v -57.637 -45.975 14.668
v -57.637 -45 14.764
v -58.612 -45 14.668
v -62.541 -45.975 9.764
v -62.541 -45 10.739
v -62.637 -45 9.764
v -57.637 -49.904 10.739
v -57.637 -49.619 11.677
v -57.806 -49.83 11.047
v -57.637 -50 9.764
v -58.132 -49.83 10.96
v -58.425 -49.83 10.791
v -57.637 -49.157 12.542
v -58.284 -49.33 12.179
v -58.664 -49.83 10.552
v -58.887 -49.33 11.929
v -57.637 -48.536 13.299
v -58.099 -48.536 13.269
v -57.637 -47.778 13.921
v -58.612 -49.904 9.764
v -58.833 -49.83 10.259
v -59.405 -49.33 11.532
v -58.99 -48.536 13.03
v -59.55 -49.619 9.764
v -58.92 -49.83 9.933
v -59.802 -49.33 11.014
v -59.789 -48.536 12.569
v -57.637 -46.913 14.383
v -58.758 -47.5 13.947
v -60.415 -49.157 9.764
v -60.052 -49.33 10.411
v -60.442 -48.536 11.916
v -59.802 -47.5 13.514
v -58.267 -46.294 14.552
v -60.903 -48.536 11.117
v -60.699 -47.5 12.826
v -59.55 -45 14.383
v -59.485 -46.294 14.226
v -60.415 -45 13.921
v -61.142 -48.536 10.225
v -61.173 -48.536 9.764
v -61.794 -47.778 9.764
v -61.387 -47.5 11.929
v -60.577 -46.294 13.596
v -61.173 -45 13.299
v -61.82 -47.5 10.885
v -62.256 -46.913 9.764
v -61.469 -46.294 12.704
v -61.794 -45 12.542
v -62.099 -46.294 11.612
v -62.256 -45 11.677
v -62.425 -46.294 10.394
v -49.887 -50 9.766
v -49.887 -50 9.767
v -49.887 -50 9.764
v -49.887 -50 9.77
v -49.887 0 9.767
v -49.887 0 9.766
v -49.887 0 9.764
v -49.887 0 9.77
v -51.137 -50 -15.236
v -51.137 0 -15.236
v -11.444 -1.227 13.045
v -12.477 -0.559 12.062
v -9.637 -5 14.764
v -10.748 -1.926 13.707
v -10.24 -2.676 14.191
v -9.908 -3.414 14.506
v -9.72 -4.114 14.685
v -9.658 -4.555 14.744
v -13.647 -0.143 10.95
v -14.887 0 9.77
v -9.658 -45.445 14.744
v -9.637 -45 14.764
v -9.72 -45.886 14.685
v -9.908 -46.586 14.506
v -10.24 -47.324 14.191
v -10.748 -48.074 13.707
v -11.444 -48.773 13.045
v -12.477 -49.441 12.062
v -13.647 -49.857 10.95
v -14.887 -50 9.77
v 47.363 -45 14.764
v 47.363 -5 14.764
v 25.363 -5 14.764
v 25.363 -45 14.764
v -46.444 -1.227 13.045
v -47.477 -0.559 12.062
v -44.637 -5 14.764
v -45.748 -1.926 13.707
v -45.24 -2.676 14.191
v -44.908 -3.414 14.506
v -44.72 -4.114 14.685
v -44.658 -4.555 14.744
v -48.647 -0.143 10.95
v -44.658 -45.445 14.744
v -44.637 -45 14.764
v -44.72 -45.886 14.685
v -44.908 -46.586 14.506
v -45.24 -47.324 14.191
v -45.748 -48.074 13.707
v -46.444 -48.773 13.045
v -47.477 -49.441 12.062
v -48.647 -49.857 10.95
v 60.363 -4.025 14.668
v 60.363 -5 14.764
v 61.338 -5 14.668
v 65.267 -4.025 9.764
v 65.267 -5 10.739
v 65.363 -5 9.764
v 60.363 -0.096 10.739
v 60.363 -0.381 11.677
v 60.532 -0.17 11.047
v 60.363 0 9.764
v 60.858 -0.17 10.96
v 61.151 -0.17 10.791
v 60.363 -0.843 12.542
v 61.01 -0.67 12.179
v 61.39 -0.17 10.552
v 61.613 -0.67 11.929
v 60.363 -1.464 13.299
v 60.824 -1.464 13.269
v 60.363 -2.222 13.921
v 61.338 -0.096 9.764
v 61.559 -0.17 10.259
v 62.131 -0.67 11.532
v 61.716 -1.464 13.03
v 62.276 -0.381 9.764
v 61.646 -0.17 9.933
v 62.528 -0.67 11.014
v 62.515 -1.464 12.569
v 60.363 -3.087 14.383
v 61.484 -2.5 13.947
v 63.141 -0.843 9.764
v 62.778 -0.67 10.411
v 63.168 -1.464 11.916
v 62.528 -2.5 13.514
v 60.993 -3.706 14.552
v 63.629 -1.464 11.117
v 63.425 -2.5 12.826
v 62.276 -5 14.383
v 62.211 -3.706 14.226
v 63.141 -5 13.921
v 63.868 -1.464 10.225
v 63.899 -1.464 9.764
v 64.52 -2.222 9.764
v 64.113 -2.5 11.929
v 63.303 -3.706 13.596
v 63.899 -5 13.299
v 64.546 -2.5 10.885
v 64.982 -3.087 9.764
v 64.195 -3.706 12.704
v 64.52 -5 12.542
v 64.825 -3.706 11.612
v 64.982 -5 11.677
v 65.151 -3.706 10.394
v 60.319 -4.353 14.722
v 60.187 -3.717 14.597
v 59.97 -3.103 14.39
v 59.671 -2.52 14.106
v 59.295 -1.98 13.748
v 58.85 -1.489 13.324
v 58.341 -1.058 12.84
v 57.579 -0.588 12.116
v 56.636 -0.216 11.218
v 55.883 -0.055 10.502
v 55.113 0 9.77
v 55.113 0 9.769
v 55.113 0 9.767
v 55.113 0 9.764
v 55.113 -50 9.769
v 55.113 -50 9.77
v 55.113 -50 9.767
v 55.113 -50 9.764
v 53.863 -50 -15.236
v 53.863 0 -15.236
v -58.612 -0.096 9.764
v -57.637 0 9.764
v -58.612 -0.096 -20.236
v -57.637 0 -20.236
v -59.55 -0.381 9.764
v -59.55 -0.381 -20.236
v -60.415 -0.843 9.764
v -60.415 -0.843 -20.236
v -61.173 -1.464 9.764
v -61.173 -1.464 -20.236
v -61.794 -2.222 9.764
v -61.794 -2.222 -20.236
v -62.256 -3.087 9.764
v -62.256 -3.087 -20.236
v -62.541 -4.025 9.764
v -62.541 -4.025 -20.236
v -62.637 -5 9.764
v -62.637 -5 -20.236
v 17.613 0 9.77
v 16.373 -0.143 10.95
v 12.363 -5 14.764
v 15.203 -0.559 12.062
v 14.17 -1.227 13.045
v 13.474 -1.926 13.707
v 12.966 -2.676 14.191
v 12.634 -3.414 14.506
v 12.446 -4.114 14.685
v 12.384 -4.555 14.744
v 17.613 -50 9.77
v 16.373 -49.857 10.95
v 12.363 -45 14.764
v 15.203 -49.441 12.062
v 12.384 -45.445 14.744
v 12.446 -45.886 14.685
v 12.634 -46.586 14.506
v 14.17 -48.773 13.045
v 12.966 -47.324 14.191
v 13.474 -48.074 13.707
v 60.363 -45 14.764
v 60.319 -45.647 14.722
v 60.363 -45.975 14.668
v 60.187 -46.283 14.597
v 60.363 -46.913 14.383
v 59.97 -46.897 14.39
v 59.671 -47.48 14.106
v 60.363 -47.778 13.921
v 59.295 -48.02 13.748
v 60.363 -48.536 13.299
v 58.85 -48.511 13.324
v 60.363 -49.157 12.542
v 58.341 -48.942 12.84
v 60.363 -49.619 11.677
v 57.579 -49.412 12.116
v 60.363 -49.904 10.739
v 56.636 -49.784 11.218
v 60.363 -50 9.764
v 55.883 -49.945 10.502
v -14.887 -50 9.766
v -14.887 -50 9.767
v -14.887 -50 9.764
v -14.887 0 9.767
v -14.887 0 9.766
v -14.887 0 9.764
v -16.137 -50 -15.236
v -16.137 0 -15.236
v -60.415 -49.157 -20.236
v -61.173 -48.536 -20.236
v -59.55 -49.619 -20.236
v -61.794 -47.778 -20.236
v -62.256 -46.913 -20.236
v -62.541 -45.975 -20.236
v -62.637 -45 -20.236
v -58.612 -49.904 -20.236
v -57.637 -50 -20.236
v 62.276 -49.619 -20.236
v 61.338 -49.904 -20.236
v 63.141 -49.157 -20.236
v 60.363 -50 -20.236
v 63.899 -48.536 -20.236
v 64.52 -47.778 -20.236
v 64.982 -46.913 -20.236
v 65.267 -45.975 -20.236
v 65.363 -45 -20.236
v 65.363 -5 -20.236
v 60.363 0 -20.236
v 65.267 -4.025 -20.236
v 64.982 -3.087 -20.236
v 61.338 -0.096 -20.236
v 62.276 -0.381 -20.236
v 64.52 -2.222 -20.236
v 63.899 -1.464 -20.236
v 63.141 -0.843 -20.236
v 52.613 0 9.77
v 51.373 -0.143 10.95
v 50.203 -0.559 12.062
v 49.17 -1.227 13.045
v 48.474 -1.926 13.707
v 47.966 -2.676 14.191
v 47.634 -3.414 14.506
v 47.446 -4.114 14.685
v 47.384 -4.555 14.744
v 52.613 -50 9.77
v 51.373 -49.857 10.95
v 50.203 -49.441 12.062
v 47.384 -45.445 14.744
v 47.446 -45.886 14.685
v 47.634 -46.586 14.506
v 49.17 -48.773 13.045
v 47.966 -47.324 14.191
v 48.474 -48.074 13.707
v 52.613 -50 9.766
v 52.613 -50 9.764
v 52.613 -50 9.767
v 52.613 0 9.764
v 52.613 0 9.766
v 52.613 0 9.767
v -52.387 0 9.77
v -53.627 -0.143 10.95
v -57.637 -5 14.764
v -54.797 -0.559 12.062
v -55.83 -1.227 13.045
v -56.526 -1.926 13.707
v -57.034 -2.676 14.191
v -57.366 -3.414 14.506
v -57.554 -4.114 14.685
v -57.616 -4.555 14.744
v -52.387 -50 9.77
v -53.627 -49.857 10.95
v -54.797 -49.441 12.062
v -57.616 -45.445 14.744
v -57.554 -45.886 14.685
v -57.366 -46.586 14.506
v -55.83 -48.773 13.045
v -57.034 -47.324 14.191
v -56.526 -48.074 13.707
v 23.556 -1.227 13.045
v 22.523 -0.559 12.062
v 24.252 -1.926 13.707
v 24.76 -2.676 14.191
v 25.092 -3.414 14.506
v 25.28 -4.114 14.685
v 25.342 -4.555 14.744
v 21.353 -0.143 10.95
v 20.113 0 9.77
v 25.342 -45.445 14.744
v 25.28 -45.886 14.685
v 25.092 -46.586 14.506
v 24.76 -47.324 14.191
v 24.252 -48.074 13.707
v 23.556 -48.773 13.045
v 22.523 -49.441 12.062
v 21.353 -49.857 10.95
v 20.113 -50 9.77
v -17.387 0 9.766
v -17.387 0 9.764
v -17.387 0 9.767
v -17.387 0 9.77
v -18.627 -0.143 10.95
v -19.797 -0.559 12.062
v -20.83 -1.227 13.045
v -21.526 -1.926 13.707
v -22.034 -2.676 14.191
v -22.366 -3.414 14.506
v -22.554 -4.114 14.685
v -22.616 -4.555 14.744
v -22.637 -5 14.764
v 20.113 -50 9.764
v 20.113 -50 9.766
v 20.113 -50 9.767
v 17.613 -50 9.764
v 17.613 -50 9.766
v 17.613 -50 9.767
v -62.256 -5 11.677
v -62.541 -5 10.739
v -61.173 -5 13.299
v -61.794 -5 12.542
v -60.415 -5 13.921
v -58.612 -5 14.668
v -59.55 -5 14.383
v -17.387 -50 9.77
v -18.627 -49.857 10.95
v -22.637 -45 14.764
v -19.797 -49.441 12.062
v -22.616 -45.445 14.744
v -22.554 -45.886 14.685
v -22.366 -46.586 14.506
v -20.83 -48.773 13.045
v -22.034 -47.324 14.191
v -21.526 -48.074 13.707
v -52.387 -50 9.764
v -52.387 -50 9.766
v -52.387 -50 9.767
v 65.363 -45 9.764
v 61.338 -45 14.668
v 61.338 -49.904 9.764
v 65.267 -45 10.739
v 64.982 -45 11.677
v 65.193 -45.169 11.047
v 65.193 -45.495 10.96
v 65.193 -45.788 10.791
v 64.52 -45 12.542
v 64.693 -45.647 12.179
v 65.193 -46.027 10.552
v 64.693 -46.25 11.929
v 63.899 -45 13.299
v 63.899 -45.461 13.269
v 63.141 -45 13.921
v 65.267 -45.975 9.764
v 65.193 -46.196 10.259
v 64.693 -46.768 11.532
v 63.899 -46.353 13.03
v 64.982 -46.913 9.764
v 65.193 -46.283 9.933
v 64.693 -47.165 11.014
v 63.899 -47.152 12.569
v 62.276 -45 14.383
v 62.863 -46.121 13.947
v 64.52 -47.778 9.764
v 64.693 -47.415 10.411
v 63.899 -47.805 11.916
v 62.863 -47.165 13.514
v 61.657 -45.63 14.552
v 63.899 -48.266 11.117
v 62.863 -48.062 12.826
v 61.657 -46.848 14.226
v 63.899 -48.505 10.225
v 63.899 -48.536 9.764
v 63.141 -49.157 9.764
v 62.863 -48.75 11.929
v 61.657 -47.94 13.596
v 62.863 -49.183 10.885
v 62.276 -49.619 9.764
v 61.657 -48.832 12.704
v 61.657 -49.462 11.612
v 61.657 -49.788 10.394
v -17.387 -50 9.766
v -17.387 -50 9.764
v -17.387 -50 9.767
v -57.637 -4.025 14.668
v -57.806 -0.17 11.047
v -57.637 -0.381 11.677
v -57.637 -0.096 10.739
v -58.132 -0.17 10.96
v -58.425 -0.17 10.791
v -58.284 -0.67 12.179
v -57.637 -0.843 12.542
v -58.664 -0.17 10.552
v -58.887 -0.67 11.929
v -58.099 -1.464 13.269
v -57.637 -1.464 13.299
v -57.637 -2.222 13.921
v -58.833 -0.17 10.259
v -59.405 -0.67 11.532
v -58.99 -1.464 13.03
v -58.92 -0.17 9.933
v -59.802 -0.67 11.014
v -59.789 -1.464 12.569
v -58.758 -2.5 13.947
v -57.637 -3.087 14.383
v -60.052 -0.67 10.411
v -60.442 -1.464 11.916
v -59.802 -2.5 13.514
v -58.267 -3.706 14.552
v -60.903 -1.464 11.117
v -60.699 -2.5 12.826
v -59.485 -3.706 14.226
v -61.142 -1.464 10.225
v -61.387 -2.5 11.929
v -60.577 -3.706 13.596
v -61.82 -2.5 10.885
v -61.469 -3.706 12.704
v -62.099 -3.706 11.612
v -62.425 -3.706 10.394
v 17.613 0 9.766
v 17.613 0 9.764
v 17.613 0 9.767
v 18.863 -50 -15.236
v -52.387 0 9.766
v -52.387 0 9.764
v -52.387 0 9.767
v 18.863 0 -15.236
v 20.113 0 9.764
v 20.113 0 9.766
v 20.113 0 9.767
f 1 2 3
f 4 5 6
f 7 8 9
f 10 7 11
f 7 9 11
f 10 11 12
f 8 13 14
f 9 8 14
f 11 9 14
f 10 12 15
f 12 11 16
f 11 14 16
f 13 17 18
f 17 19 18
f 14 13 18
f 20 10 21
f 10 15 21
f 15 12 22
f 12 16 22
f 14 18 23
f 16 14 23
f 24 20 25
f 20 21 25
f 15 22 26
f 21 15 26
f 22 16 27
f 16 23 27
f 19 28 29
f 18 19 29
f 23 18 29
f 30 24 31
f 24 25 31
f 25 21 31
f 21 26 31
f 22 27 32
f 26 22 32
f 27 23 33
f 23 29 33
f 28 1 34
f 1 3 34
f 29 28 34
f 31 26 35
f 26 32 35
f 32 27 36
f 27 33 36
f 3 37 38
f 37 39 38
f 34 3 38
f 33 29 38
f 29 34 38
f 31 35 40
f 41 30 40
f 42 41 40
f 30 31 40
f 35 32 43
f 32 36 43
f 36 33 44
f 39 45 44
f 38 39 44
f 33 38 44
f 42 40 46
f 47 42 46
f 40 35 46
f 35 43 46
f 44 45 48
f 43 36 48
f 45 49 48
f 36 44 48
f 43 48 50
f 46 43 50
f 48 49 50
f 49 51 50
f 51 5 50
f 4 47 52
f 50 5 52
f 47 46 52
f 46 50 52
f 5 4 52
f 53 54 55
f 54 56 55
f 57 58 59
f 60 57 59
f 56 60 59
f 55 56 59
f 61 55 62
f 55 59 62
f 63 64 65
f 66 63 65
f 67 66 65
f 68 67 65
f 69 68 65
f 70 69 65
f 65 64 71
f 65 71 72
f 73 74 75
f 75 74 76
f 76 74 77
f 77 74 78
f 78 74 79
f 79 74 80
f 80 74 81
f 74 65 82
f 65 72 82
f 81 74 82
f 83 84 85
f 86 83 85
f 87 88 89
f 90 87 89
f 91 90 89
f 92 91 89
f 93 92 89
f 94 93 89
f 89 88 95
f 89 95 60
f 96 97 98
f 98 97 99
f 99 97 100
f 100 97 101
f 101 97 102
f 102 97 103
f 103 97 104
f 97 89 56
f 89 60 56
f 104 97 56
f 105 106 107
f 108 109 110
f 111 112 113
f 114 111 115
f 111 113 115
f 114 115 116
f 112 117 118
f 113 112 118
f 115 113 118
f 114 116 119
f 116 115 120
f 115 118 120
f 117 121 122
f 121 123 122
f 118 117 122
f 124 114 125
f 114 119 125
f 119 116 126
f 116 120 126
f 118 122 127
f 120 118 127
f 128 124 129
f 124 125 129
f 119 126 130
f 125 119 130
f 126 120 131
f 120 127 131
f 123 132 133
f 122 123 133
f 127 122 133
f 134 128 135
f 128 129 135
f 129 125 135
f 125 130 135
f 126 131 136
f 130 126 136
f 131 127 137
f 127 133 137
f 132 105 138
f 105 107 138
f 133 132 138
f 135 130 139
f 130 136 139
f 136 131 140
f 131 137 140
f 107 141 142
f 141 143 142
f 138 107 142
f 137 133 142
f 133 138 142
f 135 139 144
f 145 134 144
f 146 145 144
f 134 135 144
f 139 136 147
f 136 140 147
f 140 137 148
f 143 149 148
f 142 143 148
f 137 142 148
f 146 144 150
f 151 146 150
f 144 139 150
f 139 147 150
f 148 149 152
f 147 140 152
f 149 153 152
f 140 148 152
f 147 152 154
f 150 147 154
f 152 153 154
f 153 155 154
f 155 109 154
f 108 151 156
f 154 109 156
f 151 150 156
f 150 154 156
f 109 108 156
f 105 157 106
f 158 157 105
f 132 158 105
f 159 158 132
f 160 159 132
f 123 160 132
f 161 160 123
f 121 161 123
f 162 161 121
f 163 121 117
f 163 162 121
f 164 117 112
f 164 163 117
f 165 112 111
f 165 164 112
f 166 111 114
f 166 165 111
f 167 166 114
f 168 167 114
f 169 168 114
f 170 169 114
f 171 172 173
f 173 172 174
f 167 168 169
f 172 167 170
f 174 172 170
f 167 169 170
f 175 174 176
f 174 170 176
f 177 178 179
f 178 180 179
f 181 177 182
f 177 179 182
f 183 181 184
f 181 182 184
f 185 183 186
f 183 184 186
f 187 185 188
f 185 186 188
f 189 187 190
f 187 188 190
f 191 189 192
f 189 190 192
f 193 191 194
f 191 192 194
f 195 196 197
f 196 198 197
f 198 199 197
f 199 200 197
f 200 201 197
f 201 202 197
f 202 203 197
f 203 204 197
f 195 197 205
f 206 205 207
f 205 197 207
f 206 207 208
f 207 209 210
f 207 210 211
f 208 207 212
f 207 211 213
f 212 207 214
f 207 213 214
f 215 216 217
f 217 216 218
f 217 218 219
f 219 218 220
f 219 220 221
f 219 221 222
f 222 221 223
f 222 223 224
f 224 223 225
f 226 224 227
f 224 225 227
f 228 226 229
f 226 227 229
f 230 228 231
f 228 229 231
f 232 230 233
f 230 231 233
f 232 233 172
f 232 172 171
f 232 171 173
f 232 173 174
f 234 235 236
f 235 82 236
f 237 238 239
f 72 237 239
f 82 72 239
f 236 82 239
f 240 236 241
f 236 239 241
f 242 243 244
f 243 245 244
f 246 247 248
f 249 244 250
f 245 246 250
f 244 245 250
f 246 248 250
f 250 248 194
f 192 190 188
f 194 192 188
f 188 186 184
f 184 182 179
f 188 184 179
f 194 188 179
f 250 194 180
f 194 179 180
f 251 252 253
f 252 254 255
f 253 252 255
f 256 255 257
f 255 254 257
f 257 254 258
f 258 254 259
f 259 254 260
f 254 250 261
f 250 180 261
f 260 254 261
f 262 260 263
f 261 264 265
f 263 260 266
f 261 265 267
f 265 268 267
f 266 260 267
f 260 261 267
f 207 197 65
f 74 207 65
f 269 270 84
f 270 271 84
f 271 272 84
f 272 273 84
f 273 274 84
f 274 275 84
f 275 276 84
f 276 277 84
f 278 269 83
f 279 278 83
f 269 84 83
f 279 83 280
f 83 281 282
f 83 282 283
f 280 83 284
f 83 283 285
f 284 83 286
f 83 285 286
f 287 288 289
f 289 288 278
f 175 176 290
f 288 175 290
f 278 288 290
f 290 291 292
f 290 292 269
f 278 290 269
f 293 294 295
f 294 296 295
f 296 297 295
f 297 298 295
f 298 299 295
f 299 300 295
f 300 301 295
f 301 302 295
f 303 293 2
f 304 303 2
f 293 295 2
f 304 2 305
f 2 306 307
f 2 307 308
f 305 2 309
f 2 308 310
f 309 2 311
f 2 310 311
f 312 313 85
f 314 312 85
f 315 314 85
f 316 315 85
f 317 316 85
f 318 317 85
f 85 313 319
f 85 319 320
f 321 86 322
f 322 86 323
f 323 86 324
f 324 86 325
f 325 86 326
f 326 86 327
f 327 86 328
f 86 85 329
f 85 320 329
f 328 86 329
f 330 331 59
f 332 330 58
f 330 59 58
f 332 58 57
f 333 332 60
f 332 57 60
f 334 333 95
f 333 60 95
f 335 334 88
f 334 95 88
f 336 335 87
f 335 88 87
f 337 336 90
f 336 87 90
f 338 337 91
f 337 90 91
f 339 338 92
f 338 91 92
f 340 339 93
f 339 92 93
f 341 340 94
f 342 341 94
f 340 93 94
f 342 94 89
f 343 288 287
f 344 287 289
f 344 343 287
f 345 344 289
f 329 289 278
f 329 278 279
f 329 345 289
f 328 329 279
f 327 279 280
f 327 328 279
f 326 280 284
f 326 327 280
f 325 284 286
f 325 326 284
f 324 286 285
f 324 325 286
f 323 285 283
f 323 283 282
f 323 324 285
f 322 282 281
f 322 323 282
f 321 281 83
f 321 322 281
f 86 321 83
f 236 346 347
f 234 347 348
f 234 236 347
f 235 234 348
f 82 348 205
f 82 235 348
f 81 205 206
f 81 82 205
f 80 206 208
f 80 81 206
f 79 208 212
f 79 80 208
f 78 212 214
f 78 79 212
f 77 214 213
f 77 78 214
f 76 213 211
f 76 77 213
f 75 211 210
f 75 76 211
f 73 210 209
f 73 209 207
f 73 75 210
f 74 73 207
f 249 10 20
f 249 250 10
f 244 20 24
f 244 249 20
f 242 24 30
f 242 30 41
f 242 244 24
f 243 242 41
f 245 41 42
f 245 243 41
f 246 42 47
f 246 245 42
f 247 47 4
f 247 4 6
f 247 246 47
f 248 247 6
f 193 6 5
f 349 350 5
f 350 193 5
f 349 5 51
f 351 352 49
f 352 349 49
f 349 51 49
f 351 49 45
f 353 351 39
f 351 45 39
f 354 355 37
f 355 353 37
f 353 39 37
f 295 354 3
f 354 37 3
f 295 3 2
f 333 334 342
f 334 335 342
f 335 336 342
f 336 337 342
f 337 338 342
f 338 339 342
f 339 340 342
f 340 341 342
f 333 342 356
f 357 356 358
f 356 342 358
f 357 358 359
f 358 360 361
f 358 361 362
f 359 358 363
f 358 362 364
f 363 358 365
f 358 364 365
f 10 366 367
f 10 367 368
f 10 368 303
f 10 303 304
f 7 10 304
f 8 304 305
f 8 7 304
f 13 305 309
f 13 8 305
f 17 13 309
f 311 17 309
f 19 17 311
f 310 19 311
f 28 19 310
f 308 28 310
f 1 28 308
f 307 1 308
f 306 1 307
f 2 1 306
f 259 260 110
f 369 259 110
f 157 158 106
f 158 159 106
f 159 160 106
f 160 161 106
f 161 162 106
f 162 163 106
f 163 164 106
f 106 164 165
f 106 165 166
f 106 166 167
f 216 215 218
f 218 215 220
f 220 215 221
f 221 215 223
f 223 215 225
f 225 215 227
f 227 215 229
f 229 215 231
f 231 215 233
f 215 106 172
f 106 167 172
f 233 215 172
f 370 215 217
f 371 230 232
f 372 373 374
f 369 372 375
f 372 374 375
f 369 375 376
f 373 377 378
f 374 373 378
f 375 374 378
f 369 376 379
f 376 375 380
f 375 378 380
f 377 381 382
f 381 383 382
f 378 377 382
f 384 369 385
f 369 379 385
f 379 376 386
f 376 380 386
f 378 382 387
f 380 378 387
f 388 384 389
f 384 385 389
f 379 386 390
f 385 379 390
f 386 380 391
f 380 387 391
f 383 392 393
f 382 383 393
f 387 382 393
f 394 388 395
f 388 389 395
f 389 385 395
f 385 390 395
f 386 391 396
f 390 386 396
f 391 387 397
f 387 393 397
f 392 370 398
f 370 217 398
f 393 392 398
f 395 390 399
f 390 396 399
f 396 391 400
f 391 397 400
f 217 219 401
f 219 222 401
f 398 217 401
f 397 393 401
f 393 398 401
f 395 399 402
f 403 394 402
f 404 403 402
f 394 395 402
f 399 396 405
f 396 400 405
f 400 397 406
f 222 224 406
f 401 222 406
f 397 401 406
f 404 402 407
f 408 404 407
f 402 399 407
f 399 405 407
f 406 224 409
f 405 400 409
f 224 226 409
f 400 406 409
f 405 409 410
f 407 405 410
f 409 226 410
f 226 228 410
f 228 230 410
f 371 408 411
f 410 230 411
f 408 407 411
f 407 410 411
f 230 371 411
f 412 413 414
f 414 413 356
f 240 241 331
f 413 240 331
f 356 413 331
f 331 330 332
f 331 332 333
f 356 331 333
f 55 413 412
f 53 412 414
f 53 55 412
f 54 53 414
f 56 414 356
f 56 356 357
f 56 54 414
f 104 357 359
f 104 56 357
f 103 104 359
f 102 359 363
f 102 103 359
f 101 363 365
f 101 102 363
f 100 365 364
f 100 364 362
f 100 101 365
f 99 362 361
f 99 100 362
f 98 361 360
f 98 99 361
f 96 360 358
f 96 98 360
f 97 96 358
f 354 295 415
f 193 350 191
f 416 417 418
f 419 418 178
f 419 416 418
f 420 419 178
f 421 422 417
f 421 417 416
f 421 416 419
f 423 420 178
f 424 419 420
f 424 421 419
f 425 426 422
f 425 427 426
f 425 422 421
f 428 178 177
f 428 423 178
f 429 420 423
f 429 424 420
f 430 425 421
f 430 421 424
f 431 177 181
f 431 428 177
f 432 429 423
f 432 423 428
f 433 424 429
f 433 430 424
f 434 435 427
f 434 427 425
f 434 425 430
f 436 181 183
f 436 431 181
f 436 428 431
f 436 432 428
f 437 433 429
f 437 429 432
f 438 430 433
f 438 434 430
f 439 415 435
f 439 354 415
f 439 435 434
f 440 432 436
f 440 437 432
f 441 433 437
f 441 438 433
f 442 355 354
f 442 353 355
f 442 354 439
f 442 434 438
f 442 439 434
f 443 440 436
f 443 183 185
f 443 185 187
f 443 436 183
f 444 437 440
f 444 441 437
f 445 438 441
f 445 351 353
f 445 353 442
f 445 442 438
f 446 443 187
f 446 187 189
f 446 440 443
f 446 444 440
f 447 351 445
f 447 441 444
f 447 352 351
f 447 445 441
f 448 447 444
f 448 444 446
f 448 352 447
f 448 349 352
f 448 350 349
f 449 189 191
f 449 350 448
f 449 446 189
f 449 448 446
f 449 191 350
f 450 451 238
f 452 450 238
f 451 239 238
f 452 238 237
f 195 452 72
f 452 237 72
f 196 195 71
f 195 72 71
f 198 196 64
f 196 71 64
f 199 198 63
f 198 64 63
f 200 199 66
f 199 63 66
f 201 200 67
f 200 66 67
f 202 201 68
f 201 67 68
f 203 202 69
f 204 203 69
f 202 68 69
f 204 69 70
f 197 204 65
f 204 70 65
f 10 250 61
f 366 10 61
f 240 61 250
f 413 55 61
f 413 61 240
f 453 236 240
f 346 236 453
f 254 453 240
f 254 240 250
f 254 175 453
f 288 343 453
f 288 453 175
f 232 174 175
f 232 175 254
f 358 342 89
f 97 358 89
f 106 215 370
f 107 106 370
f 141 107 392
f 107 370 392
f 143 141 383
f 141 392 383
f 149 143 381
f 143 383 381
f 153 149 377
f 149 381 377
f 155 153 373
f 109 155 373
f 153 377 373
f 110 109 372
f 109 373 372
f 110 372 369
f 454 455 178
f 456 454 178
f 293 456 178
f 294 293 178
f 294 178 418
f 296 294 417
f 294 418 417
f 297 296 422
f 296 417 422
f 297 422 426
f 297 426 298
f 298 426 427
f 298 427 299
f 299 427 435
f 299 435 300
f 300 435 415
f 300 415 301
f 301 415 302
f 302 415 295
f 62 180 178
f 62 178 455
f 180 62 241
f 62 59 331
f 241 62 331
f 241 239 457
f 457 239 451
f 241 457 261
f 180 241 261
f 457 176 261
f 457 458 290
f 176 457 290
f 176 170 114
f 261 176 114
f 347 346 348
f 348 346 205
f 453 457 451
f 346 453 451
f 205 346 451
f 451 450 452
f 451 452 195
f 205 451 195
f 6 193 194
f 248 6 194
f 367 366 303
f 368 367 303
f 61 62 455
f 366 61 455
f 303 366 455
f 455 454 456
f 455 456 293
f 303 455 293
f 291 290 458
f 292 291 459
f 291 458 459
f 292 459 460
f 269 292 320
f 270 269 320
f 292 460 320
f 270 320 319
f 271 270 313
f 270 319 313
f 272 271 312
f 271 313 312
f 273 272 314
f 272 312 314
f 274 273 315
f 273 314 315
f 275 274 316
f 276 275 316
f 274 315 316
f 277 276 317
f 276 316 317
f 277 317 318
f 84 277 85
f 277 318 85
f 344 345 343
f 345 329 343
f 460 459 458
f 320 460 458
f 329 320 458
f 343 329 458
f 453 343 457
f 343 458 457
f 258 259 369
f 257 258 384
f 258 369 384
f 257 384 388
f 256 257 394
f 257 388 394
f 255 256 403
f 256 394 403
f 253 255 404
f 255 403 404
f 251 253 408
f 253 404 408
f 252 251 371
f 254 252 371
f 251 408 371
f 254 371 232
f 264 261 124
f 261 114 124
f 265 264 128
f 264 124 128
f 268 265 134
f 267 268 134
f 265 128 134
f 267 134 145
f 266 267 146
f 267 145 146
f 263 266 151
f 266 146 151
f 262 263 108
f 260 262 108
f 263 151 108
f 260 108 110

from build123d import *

# Parameters (mm, degrees)
F1_DEPTH = 50
F2_SIZE  = 5
F3_R     = 4.99999


# Not quite as in the source:
# - a fillet or chamfer is up to 0.001 mm smaller than in the source, because OpenCascade refuses the exact size


with BuildPart() as f1:
    # F0 (on Front) → F1 (new body)
    with BuildSketch(Plane.XZ):
        Polygon((-62.637026581, 14.7639395539), (-62.637026581, -20.2360604461), (65.362973419, -20.2360604461), (65.362973419, 14.7639395539), (55.362973419, 14.7639395539), (53.862973419, -15.2360604461), (52.362973419, 14.7639395539), (20.362973419, 14.7639395539), (18.862973419, -15.2360604461), (17.362973419, 14.7639395539), (-14.637026581, 14.7639395539), (-16.137026581, -15.2360604461), (-17.637026581, 14.7639395539), (-49.637026581, 14.7639395539), (-51.137026581, -15.2360604461), (-52.637026581, 14.7639395539), align=None)
    extrude(amount=F1_DEPTH)

    # F2
    f2_edges = [f1.edges().sort_by_distance(p)[0] for p in [
        (-52.637027, -25, 14.76394),
        (-49.637027, -25, 14.76394),
        (-17.637027, -25, 14.76394),
        (-14.637027, -25, 14.76394),
        (17.362973, -25, 14.76394),
        (20.362973, -25, 14.76394),
        (52.362973, -25, 14.76394),
        (55.362973, -25, 14.76394),
    ]]
    chamfer(f2_edges, length=F2_SIZE)

    # F3 (radius 5 in the source; OpenCascade refuses exactly that, so slightly less here)
    f3_edges = [f1.edges().sort_by_distance(p)[0] for p in [
        (-62.637027, -25, 14.76394),
        (-60.137027, -50, 14.76394),
        (-60.137027, 0, 14.76394),
        (-33.637027, -50, 14.76394),
        (-33.637027, 0, 14.76394),
        (1.362973, 0, 14.76394),
        (1.362973, -50, 14.76394),
        (36.362973, -50, 14.76394),
        (36.362973, 0, 14.76394),
        (62.862973, -50, 14.76394),
        (65.362973, -25, 14.76394),
        (62.862973, 0, 14.76394),
        (-62.637027, -50, -2.73606),
        (-62.637027, 0, -2.73606),
        (65.362973, -50, -2.73606),
        (65.362973, 0, -2.73606),
    ]]
    fillet(f3_edges, radius=F3_R)


solid = f1.part
